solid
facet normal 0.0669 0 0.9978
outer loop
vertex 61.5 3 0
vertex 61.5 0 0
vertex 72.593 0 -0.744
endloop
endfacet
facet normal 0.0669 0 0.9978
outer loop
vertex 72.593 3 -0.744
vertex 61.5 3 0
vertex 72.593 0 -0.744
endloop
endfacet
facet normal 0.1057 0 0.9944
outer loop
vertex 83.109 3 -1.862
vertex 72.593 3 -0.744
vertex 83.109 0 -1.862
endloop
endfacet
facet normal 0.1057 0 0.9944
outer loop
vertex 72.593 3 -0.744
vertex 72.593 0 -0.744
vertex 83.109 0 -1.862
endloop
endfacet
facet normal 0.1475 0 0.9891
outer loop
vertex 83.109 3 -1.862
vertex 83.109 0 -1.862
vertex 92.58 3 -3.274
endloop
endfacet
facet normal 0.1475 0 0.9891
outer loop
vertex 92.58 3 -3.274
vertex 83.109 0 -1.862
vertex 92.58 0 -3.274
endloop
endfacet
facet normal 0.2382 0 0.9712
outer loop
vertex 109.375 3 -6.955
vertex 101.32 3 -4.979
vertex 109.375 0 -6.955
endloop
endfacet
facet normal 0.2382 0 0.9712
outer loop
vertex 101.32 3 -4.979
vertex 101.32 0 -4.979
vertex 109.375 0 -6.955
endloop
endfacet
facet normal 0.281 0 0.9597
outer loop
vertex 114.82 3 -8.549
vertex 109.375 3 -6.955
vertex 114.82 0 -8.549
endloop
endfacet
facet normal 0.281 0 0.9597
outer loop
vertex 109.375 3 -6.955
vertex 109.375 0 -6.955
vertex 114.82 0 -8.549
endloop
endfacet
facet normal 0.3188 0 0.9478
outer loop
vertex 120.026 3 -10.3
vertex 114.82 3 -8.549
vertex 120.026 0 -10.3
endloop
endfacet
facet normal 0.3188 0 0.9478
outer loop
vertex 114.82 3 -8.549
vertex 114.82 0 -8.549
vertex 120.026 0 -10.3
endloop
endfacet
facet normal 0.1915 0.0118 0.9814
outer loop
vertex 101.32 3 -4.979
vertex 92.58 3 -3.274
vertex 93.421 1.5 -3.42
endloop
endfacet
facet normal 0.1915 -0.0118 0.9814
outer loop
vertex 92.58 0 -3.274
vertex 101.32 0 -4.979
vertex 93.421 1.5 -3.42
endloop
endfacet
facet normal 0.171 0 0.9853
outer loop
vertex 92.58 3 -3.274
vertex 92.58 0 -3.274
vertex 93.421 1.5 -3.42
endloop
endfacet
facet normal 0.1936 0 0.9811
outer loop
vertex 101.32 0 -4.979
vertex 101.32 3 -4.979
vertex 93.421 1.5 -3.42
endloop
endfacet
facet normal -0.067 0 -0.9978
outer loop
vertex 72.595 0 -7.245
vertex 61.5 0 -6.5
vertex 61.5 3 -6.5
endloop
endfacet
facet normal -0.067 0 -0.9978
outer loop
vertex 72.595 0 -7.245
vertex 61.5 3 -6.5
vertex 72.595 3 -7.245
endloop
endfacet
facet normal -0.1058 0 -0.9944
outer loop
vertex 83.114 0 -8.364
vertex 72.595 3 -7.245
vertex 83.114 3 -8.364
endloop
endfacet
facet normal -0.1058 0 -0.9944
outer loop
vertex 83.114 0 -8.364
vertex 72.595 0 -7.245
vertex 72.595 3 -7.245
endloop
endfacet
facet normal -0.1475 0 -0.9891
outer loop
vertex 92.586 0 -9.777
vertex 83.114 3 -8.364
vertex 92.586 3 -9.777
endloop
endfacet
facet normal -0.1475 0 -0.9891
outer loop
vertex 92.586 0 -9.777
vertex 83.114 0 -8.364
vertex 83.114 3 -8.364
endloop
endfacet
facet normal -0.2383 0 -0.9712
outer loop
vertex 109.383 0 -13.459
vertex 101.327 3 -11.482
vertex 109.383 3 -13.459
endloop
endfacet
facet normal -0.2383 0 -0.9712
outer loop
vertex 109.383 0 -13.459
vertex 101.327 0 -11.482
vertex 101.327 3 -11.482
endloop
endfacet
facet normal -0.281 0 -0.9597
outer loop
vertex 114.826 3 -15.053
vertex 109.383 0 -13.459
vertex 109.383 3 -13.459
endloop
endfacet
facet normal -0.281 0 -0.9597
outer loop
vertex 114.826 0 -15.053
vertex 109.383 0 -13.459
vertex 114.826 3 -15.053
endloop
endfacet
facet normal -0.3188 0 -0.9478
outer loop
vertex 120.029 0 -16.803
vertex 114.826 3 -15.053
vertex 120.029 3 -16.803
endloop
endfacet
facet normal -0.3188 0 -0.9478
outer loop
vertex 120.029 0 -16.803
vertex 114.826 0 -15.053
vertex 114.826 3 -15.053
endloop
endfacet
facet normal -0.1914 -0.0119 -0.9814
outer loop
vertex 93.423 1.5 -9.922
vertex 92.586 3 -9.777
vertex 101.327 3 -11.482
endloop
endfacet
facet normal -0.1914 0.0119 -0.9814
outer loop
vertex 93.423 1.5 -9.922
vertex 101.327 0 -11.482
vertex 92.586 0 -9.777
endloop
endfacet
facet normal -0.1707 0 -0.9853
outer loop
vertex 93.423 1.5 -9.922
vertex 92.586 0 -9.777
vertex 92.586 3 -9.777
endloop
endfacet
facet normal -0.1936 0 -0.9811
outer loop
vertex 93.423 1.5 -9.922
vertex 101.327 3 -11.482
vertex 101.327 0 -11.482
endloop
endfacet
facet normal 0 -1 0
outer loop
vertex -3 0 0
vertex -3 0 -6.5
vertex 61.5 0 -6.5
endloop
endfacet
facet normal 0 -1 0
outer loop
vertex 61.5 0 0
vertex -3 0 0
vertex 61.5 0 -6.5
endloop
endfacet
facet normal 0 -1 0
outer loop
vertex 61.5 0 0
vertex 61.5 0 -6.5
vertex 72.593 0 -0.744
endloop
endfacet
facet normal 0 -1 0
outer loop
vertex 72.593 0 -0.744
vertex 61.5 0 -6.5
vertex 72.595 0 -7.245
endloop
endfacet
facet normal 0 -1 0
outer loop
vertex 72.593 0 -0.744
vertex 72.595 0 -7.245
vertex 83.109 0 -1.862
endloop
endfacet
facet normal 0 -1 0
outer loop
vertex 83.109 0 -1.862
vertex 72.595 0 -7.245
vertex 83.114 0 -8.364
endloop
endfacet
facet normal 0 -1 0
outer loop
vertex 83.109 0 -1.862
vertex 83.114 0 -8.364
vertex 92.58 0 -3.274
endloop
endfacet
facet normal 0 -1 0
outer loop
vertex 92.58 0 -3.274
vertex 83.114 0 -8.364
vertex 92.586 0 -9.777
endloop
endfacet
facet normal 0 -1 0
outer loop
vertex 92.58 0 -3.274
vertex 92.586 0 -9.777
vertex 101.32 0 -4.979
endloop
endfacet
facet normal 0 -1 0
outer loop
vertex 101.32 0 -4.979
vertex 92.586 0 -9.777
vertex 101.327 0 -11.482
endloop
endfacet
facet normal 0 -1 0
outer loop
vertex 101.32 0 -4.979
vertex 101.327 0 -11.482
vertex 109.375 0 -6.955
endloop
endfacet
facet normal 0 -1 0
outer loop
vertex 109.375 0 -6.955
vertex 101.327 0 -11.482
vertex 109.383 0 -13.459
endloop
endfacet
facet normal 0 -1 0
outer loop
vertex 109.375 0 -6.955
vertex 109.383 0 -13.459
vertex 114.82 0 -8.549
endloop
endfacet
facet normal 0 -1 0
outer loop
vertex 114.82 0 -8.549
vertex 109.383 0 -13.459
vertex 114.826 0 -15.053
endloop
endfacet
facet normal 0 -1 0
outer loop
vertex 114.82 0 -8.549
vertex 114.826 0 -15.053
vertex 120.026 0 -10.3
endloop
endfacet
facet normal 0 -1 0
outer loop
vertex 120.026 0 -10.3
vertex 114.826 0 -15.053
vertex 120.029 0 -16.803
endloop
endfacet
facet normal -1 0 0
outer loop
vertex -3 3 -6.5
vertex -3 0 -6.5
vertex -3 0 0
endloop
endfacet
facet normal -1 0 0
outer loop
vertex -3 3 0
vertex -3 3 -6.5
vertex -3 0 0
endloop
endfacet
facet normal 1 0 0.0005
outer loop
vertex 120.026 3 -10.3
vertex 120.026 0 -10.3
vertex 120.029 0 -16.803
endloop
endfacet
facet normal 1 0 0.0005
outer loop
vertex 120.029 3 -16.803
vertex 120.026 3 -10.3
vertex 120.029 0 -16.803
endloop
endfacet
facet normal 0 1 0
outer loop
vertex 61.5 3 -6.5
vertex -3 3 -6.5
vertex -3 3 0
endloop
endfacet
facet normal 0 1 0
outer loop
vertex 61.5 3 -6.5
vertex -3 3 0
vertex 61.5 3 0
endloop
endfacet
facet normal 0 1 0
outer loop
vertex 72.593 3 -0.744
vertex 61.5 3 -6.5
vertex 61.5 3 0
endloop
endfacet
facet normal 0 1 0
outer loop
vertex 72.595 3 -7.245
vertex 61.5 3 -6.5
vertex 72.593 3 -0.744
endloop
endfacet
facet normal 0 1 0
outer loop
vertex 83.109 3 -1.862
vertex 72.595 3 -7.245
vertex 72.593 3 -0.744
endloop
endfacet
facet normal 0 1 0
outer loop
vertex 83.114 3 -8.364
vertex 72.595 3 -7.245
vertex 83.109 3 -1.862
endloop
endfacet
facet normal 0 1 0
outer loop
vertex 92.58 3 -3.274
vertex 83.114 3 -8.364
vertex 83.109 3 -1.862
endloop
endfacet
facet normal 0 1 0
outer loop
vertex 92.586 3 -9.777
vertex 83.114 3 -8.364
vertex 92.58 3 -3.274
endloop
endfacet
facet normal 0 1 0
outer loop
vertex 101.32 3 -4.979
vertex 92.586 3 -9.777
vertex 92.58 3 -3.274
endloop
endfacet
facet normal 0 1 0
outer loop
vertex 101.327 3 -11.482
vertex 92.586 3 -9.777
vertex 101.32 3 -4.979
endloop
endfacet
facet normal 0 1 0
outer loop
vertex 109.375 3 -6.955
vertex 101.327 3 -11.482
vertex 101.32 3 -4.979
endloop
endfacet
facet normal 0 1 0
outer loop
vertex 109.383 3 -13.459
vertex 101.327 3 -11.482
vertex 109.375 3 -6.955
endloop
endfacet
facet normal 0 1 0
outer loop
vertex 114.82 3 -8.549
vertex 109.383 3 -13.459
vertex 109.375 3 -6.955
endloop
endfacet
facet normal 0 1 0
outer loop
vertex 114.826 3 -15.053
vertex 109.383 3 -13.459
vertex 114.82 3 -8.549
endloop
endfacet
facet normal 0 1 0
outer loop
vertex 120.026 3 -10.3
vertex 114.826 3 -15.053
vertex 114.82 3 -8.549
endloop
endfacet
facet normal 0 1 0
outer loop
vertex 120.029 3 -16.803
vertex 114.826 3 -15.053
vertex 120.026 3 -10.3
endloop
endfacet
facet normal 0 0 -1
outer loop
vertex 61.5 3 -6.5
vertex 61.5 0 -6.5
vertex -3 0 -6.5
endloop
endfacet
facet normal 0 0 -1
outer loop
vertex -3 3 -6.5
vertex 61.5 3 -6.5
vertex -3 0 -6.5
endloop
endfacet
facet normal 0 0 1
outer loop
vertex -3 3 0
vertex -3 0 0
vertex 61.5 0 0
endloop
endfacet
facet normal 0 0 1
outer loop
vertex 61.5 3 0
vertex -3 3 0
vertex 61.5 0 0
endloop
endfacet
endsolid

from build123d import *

# Parameters (mm, degrees)
BOSS_EXTRUDE1_DEPTH = 3


with BuildPart() as part:
    # Sketch1 → Boss-Extrude1 (new body)
    with BuildSketch(Plane(origin=(0, 0, 0), x_dir=(1, 0, 0), z_dir=(0, 1, 0))):
        with BuildLine():
            Line((0, 0), (61.5, 0))
            add(Edge.make_bspline(
                [(61.5, 0), (96.079868576, 1.689945504), (120.026085552, 10.3)],
                knots=[0, 0, 0, 1, 1, 1], degree=2))
            Line((120.026085552, 10.3), (120.028762053, 16.803234674))
            add(Edge.make_bspline(
                [(61.5, 6.5), (96.082545077, 8.193180177), (120.028762053, 16.803234674)],
                knots=[0, 0, 0, 1, 1, 1], degree=2))
            Line((61.5, 6.5), (0, 6.5))
            Line((0, 6.5), (-3, 6.5))
            Line((-3, 6.5), (-3, 0))
            Line((-3, 0), (0, 0))
        make_face()
    extrude(amount=BOSS_EXTRUDE1_DEPTH)


solid = part.part
